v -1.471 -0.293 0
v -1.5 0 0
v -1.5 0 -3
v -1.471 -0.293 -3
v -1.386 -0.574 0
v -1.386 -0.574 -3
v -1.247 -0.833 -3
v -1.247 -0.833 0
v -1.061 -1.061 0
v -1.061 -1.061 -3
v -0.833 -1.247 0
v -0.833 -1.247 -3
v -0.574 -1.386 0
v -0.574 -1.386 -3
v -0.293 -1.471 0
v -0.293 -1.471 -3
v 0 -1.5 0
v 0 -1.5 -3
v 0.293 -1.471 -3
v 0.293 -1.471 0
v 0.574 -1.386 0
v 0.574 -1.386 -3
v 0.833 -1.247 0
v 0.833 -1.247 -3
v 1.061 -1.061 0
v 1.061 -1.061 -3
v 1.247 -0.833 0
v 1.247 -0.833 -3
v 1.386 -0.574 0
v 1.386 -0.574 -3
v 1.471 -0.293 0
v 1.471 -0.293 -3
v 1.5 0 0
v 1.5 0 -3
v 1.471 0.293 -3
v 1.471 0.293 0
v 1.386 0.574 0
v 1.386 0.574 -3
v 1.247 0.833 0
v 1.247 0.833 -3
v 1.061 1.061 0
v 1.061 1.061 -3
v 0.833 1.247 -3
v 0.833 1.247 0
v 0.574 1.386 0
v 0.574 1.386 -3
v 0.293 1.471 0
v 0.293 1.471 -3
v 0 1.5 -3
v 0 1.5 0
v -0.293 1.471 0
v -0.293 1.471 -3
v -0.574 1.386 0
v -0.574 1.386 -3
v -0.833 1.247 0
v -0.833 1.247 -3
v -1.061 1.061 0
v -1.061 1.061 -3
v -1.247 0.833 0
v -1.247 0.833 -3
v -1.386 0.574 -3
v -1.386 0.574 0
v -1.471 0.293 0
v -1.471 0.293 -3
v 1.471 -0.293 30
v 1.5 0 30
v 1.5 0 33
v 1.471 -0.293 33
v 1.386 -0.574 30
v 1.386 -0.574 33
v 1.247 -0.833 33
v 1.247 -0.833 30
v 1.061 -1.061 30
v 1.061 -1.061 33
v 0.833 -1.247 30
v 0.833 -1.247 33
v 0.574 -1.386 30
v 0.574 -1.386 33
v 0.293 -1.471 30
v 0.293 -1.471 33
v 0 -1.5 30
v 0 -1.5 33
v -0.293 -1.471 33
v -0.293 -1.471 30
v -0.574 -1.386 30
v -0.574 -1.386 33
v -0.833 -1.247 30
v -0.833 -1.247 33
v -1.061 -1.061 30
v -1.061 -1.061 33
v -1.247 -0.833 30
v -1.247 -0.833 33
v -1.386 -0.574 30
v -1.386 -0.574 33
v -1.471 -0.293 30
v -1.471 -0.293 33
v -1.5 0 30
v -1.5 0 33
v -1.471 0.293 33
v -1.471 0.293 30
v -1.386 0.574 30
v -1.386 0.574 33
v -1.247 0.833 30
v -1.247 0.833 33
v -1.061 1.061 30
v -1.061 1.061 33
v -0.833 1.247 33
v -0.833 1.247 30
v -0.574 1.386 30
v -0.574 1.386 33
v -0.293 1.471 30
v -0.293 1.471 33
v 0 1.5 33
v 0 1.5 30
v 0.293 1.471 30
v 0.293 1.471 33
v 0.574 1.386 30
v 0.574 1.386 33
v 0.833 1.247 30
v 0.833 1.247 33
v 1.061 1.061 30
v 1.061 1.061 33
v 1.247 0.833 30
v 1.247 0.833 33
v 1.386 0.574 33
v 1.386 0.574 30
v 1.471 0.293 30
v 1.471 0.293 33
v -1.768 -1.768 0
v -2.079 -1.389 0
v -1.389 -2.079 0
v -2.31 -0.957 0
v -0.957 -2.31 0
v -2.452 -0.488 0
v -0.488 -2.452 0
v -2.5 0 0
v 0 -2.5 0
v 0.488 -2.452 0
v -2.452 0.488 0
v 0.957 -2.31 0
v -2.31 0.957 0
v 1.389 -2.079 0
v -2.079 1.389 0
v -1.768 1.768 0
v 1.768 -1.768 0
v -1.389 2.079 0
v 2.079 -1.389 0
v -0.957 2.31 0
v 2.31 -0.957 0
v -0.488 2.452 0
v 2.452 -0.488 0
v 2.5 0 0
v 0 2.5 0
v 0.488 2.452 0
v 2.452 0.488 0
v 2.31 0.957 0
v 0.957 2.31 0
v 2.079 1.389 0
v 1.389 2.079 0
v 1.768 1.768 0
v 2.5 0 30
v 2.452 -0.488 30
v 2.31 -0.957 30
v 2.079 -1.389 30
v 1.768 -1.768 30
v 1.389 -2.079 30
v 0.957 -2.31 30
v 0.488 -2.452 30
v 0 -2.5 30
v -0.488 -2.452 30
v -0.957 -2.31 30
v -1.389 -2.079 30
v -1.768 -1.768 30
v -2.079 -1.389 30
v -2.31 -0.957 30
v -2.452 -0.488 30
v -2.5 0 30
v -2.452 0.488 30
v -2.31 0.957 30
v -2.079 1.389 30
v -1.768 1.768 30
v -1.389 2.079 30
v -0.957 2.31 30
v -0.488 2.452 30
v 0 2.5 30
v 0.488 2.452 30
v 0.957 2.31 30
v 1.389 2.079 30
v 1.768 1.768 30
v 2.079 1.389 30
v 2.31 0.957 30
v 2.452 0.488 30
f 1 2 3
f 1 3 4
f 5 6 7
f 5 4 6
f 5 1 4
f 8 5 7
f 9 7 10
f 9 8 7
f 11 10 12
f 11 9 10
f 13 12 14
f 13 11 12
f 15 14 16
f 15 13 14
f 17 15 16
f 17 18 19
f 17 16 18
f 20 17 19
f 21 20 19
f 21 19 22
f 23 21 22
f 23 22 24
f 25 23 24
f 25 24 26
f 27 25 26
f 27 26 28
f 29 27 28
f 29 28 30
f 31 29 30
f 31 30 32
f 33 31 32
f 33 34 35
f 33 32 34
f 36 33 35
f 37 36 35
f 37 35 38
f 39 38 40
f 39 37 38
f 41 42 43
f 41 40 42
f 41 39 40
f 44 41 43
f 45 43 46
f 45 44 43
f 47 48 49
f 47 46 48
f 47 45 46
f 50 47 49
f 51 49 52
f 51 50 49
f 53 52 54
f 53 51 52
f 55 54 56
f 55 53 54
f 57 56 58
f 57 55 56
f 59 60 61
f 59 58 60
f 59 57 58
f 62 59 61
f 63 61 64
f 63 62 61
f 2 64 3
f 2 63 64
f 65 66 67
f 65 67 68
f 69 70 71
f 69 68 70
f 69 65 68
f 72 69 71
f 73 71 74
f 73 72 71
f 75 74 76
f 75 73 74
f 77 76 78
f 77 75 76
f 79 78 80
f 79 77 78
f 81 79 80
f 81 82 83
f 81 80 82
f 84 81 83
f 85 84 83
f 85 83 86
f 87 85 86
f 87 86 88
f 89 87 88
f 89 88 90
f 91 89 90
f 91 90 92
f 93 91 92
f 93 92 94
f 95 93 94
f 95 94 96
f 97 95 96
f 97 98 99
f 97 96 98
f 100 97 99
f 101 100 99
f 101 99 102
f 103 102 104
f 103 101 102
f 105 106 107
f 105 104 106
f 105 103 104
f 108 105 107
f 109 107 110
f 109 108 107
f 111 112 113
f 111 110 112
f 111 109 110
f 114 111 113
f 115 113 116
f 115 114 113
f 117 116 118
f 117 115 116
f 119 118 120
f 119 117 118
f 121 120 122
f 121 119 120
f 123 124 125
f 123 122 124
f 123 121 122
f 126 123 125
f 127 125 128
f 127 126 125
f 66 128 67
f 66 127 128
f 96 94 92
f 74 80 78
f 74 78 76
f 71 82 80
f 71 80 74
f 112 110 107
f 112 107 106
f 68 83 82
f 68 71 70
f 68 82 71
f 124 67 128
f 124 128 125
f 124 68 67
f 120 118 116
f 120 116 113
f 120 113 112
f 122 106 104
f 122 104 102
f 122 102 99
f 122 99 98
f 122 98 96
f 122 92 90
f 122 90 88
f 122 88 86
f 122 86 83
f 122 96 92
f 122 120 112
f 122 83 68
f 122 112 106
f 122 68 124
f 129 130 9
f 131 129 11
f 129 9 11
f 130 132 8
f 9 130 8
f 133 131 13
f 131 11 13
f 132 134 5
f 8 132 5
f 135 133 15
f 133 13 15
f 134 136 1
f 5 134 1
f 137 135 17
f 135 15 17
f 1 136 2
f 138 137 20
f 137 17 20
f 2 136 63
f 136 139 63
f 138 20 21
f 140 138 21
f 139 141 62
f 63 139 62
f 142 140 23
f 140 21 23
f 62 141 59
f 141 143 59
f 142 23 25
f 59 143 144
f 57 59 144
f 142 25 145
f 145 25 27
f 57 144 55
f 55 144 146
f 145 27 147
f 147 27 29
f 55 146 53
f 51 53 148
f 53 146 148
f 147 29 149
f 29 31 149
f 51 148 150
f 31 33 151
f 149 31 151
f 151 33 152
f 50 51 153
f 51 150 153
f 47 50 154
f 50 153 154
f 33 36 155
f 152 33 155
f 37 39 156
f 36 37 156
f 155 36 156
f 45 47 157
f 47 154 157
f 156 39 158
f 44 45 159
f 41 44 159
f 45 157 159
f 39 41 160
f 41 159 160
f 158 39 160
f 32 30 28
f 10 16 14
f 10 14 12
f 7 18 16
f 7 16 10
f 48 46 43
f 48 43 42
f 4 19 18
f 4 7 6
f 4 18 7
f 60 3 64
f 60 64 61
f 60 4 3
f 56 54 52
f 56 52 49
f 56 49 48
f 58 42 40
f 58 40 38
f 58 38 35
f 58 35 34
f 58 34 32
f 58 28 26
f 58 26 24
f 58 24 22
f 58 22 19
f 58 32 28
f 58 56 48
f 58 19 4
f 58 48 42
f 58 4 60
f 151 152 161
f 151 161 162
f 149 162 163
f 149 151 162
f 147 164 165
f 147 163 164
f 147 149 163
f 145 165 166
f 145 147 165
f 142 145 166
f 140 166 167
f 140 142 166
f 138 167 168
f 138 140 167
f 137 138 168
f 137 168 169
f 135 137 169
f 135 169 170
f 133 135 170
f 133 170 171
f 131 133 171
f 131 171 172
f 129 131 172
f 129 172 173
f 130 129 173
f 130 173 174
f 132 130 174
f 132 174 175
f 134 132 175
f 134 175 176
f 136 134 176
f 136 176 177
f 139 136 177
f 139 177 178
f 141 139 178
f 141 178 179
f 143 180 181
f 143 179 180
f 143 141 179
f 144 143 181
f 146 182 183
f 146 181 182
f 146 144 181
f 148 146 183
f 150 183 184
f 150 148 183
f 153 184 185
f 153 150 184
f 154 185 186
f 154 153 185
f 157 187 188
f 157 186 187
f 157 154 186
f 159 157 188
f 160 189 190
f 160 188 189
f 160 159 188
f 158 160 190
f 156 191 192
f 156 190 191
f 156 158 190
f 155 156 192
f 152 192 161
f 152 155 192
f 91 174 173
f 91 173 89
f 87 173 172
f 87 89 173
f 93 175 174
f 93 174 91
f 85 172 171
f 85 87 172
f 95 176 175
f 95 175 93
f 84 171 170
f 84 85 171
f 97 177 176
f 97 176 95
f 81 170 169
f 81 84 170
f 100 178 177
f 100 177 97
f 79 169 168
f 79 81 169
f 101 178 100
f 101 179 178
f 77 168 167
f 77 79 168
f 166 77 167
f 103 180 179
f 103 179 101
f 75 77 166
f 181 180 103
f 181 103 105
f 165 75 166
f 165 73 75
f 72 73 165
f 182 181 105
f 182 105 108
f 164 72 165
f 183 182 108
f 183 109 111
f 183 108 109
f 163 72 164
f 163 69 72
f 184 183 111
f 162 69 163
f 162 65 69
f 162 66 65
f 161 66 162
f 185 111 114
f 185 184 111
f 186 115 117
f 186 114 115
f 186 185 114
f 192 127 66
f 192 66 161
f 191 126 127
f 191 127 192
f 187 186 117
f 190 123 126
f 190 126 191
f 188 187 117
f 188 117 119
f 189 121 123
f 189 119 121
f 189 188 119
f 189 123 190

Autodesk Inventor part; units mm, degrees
ref_plane "YZ Plane" through (0, 0, 0) normal (1, 0, 0) x (0, 1, 0)
ref_plane "XZ Plane" through (0, 0, 0) normal (0, 1, 0) x (-1, 0, 0)
ref_plane "XY Plane" through (0, 0, 0) normal (0, 0, 1) x (1, 0, 0)
sketch "Sketch1" plane through (0, 0, 0) normal (0, 0, 1) x (1, 0, 0)
  circle A0 centre (0, 0) radius 2.5
  dimension "d0" = 5
extrude "Extrusion1" add sketch "Sketch1" along normal blind 30
sketch "Sketch2" plane through (0, 0, 30) normal (0, 0, 1) x (1, 0, 0)
  circle A0 centre (0, 0) radius 2.5 projected
  circle A1 centre (0, 0) radius 1.5
  dimension "d3" = 3
extrude "Extrusion2" add sketch "Sketch2" along normal blind 3 contours A1
thread "Thread1" size "M3x0.5" class "6g" standard "ANSI Metric M Profile" full length
sketch "Sketch3" plane through (0, 0, 0) normal (0, 0, -1) x (-1, 0, 0)
  circle A0 centre (0, 0) radius 2.5 projected
  circle A1 centre (0, 0) radius 1.5
  dimension "d8" = 3
extrude "Extrusion3" add sketch "Sketch3" along normal blind 3 contours A1
thread "Thread2" size "M3x0.5" class "6g" standard "ANSI Metric M Profile" full length
properties part number "spacer 5cm"
